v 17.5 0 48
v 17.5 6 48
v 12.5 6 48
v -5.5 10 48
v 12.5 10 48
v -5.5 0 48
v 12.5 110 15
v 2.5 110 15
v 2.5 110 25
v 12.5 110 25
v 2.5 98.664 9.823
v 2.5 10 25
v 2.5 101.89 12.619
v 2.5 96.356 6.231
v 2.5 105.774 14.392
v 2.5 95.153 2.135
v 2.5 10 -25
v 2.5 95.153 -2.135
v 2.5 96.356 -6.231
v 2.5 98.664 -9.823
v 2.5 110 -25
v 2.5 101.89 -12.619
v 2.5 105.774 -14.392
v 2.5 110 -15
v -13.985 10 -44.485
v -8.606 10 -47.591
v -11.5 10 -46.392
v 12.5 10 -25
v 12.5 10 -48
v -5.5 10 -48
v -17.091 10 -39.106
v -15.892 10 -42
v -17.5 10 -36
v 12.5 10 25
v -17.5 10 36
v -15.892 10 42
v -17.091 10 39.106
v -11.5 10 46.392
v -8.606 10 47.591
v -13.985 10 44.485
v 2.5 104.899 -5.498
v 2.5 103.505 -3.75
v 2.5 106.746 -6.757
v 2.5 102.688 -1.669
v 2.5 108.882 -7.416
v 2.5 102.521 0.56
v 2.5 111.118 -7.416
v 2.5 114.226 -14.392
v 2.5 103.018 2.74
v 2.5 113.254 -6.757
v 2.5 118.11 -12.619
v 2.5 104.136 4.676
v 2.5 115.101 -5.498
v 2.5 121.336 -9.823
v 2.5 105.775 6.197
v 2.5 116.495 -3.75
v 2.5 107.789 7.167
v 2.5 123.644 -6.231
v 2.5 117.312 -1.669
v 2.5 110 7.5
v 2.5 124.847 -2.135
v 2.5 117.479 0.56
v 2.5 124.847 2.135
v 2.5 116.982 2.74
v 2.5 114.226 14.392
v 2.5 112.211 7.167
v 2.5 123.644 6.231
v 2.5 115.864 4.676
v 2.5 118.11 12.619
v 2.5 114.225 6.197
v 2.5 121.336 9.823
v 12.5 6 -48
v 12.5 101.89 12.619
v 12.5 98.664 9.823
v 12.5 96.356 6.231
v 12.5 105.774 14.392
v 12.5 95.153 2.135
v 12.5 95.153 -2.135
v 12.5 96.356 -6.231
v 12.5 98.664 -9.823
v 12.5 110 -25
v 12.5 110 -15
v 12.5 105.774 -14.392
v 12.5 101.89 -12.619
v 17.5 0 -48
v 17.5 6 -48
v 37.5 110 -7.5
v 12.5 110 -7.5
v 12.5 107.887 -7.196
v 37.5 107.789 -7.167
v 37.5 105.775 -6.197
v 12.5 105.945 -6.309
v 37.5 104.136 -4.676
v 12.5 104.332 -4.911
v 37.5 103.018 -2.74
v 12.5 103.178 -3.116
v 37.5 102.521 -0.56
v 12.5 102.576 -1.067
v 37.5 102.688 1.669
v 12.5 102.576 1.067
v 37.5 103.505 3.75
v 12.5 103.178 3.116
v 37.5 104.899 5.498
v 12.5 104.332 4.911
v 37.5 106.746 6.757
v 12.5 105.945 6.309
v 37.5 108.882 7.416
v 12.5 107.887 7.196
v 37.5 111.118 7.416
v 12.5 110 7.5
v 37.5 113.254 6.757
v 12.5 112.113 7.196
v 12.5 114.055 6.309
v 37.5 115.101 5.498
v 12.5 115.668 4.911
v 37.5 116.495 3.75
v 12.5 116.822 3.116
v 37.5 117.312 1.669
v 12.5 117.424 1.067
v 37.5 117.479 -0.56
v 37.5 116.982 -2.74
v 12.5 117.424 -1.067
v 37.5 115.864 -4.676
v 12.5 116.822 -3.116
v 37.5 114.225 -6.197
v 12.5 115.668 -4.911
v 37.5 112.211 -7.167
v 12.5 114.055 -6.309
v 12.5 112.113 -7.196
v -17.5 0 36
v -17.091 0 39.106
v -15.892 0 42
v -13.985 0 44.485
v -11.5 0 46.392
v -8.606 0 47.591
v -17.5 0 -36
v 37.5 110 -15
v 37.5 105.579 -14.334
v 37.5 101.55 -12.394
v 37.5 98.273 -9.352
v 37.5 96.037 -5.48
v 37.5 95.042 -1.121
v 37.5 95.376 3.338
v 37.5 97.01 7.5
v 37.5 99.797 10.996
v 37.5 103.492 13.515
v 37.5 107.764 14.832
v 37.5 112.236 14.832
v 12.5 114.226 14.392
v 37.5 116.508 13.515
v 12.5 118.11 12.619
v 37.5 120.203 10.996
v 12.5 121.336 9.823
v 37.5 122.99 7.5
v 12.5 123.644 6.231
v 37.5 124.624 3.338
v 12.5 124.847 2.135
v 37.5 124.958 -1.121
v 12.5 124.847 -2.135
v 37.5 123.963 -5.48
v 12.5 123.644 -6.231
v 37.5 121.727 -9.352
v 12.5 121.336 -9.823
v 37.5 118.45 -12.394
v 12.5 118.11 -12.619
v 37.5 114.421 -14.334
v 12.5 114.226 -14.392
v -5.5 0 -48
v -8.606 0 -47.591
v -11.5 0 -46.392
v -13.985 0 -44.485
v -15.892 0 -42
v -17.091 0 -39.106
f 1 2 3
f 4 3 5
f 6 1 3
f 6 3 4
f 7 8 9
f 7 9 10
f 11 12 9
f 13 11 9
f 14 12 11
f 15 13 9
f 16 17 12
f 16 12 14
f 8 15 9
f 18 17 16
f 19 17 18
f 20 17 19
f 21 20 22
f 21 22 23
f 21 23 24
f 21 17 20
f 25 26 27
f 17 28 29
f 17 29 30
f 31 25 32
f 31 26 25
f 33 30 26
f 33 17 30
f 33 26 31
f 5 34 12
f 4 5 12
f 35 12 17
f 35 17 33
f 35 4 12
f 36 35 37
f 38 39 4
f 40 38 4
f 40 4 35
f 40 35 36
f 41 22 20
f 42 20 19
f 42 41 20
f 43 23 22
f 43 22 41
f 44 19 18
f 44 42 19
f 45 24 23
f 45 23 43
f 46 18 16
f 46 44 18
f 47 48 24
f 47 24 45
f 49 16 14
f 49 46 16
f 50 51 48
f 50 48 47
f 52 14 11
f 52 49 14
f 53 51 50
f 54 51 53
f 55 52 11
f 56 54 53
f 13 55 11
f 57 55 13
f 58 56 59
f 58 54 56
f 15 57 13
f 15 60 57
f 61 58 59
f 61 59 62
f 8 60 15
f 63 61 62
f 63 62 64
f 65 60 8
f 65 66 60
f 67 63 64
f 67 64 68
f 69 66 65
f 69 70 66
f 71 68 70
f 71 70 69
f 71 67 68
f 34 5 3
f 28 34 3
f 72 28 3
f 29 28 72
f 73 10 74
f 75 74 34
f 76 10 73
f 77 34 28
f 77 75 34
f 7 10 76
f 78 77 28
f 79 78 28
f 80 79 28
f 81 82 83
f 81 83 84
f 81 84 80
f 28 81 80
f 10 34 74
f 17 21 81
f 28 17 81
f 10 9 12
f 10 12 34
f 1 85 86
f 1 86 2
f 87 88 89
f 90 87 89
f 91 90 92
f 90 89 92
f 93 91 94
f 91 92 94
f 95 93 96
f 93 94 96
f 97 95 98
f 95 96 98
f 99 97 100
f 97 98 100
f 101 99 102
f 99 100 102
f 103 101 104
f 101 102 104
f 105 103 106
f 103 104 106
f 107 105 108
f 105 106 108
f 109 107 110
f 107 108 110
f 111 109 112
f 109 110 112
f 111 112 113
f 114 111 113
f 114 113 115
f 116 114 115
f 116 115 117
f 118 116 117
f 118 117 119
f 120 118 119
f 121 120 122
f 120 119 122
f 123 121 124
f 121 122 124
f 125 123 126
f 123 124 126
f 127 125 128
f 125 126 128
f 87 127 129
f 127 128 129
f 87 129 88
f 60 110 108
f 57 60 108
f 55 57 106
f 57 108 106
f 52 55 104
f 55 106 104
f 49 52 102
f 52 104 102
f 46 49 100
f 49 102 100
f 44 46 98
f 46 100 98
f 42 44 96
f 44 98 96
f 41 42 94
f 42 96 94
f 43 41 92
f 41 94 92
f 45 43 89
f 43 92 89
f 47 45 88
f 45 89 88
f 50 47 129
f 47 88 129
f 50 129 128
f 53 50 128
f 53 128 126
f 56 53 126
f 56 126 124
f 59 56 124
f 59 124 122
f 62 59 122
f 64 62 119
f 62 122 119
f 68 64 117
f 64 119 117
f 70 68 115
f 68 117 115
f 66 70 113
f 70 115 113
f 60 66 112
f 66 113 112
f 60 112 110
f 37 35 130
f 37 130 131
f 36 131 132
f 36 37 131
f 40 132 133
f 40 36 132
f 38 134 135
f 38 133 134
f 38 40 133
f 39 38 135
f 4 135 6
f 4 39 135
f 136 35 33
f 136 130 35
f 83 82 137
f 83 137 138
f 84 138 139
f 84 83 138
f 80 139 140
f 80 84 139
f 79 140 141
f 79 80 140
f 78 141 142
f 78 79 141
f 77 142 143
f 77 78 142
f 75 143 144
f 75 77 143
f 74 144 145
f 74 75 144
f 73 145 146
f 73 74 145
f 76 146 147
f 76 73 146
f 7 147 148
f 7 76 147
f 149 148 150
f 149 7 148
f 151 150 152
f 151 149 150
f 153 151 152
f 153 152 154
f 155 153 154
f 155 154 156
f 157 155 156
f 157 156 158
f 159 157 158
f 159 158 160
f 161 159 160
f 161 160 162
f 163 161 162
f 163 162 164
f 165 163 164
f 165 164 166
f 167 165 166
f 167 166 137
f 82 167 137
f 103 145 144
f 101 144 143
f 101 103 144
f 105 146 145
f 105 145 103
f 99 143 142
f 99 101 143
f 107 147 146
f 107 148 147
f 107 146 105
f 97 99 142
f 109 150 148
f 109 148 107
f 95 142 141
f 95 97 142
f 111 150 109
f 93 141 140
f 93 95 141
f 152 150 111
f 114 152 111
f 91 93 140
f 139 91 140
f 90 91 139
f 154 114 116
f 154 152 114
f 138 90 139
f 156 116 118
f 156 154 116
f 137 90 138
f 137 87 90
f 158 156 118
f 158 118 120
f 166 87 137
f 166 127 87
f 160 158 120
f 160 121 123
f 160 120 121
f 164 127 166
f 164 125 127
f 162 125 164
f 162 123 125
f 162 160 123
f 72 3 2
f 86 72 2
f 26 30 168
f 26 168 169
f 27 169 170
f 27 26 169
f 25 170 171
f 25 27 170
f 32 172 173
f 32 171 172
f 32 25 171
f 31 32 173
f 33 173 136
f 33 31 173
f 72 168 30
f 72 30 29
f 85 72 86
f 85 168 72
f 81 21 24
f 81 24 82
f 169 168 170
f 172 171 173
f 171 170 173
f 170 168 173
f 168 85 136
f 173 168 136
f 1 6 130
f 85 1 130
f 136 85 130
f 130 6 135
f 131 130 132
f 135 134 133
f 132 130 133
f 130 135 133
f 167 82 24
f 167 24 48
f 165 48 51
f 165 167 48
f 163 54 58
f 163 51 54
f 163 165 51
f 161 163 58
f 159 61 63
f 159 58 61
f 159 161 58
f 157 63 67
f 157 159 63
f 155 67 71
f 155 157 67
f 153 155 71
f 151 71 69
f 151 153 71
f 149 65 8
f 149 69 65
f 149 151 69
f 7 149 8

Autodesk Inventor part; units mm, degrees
ref_plane "YZ Plane" through (0, 0, 0) normal (1, 0, 0) x (0, 1, 0)
ref_plane "XZ Plane" through (0, 0, 0) normal (0, 1, 0) x (-1, 0, 0)
ref_plane "XY Plane" through (0, 0, 0) normal (0, 0, 1) x (1, 0, 0)
sketch "Sketch1" plane through (0, 0, 0) normal (0, 1, 0) x (-1, 0, 0)
  line L0 (-17.5, 48) -> (17.5, 48)
  line L1 (17.5, 48) -> (17.5, -48)
  line L2 (17.5, -48) -> (-17.5, -48)
  line L3 (-17.5, -48) -> (-17.5, 48)
  line L4 (-17.5, 48) -> (17.5, -48) construction
  line L5 (17.5, 48) -> (-17.5, -48) construction
  point P0 (0, 0)
  dimension "d0" = 96
  dimension "d1" = 35
extrude "Extrusion1" add sketch "Sketch1" along normal blind 10
fillet "Fillet1" radius 12 2 edges at (-17.5, 5, 48) (-17.5, 5, -48)
sketch "Sketch2" plane through (17.5, 0, 48) normal (0, 0, 1) x (1, 0, 0)
  line L0 (0, 10) -> (-23, 10) projected
  line L1 (0, 10) -> (-5, 10)
  line L2 (-5, 10) -> (-5, 6)
  line L3 (-5, 6) -> (0, 6)
  line L4 (0, 6) -> (0, 10)
  line L5 (-23, 0) -> (0, 0) projected
  point P0 (-17.5, 0)
  dimension "d5" = 6
  dimension "d6" = 5
extrude "Extrusion2" cut sketch "Sketch2" against normal through all
sketch "Sketch3" plane through (0, 0, 0) normal (0, 0, 1) x (1, 0, 0)
  line L0 (12.5, 10) -> (2.5, 10)
  line L1 (2.5, 10) -> (2.5, 110)
  line L2 (2.5, 110) -> (12.5, 110)
  line L3 (12.5, 110) -> (12.5, 10)
  point P0 (0, 0)
  dimension "d9" = 10
  dimension "d10" = 100
extrude "Extrusion3" add sketch "Sketch3" along normal mid plane 50
sketch "Sketch4" plane through (12.5, 6, 48) normal (1, 0, 0) x (0, 0, -1)
  line L0 (23, 104) -> (73, 104) projected
  circle A0 centre (48, 104) radius 15
  point P0 (48, -6)
  point P1 (63, 104)
  point P2 (33, 104)
  dimension "d13" = 30
sketch "Sketch5" plane through (12.5, 6, 48) normal (1, 0, 0) x (0, 0, -1)
  point P0 (48, -6)
extrude "Extrusion4" add sketch "Sketch4" against normal blind 50 contours A0 L0 picked at (49.773, 108.6751)
sketch "Sketch6" plane through (12.5, 6, 48) normal (1, 0, 0) x (0, 0, -1)
  line L0 (63, 104) -> (33, 104) projected
  circle A0 centre (48, 104) radius 15
  point P0 (48, -6)
  dimension "d16" = 30
extrude "Extrusion5" cut sketch "Sketch6" against normal blind 50
sketch "Sketch7" plane through (12.5, 6, 48) normal (1, 0, 0) x (0, 0, -1)
  arc A0 (33, 104) -> (63, 104) centre (48, 104) ccw projected
  circle A1 centre (48, 104) radius 15
  circle A2 centre (48, 104) radius 7.5
  point P0 (48, -6)
  dimension "d19" = 30
  dimension "d20" = 15
extrude "Extrusion6" add sketch "Sketch7" along normal blind 25
sketch "Sketch8" plane through (12.5, 6, 48) normal (-1, 0, 0) x (0, 0, 1)
  circle A0 centre (-48, 104) radius 7.5 projected
  circle A1 centre (-48, 104) radius 15
  circle A2 centre (-48, 104) radius 7.5
  point P0 (-48, -6)
  dimension "d23" = 15
extrude "Extrusion7" add sketch "Sketch8" along normal blind 10
properties part number "gh"
